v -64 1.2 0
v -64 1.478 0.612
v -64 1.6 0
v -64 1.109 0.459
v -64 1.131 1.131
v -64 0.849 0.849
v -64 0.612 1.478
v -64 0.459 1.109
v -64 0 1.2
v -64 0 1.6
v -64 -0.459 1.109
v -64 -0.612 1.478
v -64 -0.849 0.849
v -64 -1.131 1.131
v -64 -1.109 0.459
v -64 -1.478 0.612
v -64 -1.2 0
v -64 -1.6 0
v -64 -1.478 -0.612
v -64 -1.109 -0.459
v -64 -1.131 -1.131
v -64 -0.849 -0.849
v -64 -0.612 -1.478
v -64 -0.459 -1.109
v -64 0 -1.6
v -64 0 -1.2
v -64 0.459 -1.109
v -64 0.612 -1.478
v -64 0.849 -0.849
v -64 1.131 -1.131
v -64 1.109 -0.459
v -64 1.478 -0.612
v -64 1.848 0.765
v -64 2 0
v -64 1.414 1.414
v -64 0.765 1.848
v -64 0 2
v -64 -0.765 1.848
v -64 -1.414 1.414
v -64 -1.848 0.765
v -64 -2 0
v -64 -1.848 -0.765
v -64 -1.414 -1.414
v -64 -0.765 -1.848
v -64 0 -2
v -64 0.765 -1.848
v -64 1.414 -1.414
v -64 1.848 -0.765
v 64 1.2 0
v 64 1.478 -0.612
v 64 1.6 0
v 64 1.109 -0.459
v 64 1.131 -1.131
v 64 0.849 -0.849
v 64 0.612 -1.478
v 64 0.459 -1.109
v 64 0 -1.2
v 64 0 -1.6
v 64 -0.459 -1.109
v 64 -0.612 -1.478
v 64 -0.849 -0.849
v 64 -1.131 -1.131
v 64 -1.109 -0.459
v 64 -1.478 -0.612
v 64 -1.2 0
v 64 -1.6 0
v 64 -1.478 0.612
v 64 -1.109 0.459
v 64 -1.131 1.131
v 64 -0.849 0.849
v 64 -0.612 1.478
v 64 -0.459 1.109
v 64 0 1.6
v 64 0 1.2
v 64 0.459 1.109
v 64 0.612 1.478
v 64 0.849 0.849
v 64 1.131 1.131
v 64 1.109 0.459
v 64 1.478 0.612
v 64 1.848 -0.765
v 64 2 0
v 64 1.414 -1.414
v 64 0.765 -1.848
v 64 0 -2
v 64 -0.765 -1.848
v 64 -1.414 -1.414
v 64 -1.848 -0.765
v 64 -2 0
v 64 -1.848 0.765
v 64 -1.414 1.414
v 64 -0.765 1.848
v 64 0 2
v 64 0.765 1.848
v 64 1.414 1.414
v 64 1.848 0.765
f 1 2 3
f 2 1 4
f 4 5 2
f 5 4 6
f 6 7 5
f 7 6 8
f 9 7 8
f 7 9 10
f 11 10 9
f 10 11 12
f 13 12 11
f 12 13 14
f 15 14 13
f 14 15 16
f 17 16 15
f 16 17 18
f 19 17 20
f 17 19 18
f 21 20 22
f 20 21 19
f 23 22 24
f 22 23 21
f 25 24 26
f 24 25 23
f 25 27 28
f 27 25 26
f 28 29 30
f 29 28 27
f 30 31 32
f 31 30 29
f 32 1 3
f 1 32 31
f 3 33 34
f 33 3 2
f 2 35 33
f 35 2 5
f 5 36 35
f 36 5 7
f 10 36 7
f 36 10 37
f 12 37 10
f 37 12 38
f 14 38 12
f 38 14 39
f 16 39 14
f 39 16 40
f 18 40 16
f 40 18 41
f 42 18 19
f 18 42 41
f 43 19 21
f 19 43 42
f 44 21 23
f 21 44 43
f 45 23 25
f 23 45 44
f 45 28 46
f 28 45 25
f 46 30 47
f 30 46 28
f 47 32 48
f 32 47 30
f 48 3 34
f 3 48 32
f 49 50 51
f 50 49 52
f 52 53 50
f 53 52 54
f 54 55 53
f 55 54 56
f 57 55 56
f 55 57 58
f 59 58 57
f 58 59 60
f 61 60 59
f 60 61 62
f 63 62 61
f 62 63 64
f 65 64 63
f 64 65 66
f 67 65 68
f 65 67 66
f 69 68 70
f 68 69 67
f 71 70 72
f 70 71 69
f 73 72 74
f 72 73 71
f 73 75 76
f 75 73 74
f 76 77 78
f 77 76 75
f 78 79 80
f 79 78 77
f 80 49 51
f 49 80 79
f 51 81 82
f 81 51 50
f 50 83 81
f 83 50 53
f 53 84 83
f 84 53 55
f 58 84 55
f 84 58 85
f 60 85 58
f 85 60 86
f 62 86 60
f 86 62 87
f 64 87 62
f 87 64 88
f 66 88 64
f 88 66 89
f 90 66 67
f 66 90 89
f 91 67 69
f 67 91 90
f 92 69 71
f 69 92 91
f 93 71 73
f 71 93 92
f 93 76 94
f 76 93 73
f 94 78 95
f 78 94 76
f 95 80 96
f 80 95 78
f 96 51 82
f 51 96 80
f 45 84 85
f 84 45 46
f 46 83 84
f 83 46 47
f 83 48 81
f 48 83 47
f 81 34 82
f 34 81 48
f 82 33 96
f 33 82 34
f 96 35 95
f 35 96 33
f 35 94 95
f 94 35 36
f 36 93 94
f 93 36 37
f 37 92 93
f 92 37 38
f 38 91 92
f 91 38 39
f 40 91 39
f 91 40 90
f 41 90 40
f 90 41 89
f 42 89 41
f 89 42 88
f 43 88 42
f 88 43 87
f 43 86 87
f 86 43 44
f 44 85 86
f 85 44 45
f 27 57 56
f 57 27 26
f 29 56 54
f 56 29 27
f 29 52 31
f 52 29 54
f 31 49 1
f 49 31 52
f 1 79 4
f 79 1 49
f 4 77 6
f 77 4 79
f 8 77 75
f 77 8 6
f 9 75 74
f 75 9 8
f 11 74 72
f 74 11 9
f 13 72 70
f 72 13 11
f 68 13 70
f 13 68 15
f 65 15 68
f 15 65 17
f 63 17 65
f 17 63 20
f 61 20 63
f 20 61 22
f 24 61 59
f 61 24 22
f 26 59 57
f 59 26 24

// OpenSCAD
// file: ../p/4-4disc.scad
use <../lib.scad>
$fa=1; $fs=0.2;
function ldraw_lib__4_4disc(realsolid=false) = [
// 0 Disc 1.0
// 0 Name: 4-4disc.dat
// 0 Author: James Jessiman
// 0 !LDRAW_ORG Primitive UPDATE 2002-02
// 0 !LICENSE Licensed under CC BY 2.0 and CC BY 4.0 : see CAreadme.txt
// 
// 0 BFC CERTIFY CCW
  [0,"BFC","CERTIFY"],
  [0,"BFC","CCW"],
// 
// 0 !HISTORY 1998-12-15 [PTadmin] Official Update 1998-10
// 0 !HISTORY 2002-03-23 [sbliss] Added BFC statement
// 0 !HISTORY 2002-04-25 [PTadmin] Official Update 2002-02
// 0 !HISTORY 2007-06-24 [PTadmin] Header formatted for Contributor Agreement
// 0 !HISTORY 2008-07-01 [PTadmin] Official Update 2008-01
// 
// 
// 3 16 0 0 0 1 0 0 0.9239 0 0.3827
  [3,16,0,0,0,1,0,0,0.9239,0,0.3827],
// 3 16 0 0 0 0.9239 0 0.3827 0.7071 0 0.7071
  [3,16,0,0,0,0.9239,0,0.3827,0.7071,0,0.7071],
// 3 16 0 0 0 0.7071 0 0.7071 0.3827 0 0.9239
  [3,16,0,0,0,0.7071,0,0.7071,0.3827,0,0.9239],
// 3 16 0 0 0 0.3827 0 0.9239 0 0 1
  [3,16,0,0,0,0.3827,0,0.9239,0,0,1],
// 3 16 0 0 0 0 0 1 -0.3827 0 0.9239
  [3,16,0,0,0,0,0,1,-0.3827,0,0.9239],
// 3 16 0 0 0 -0.3827 0 0.9239 -0.7071 0 0.7071
  [3,16,0,0,0,-0.3827,0,0.9239,-0.7071,0,0.7071],
// 3 16 0 0 0 -0.7071 0 0.7071 -0.9239 0 0.3827
  [3,16,0,0,0,-0.7071,0,0.7071,-0.9239,0,0.3827],
// 3 16 0 0 0 -0.9239 0 0.3827 -1 0 -0
  [3,16,0,0,0,-0.9239,0,0.3827,-1,0,-0],
// 3 16 0 0 0 -1 0 -0 -0.9239 0 -0.3827
  [3,16,0,0,0,-1,0,-0,-0.9239,0,-0.3827],
// 3 16 0 0 0 -0.9239 0 -0.3827 -0.7071 0 -0.7071
  [3,16,0,0,0,-0.9239,0,-0.3827,-0.7071,0,-0.7071],
// 3 16 0 0 0 -0.7071 0 -0.7071 -0.3827 0 -0.9239
  [3,16,0,0,0,-0.7071,0,-0.7071,-0.3827,0,-0.9239],
// 3 16 0 0 0 -0.3827 0 -0.9239 0 0 -1
  [3,16,0,0,0,-0.3827,0,-0.9239,0,0,-1],
// 3 16 0 0 0 0 0 -1 0.3827 0 -0.9239
  [3,16,0,0,0,0,0,-1,0.3827,0,-0.9239],
// 3 16 0 0 0 0.3827 0 -0.9239 0.7071 0 -0.7071
  [3,16,0,0,0,0.3827,0,-0.9239,0.7071,0,-0.7071],
// 3 16 0 0 0 0.7071 0 -0.7071 0.9239 0 -0.3827
  [3,16,0,0,0,0.7071,0,-0.7071,0.9239,0,-0.3827],
// 3 16 0 0 0 0.9239 0 -0.3827 1 0 0
  [3,16,0,0,0,0.9239,0,-0.3827,1,0,0],
// 0
];
module ldraw_lib__4_4disc(step=0, col=false, unit=2/5, alt=false, line=0.2, solid=!$preview)
    makepoly(ldraw_lib__4_4disc(solid), step=step, col=col, unit=unit, alt=alt, line=line, solid=solid);
ldraw_lib__4_4disc(line=0.2);
// file: ../p/stud3.scad
use <../lib.scad>
use <4-4cyli.scad>
use <4-4disc.scad>
use <4-4edge.scad>
$fa=1; $fs=0.2;
function ldraw_lib__stud3(realsolid=false) = realsolid ? 
    [openscad(translate([0,0,-eps()], o=cylinder(4+eps(), r=4)),2)] : [
// 0 Stud Tube Solid
// 0 Name: stud3.dat
// 0 Author: James Jessiman
// 0 !LDRAW_ORG Primitive UPDATE 2012-01
// 0 !LICENSE Licensed under CC BY 2.0 and CC BY 4.0 : see CAreadme.txt
// 
// 0 BFC CERTIFY CCW
  [0,"BFC","CERTIFY"],
  [0,"BFC","CCW"],
// 
// 0 !HISTORY 2002-04-04 [sbliss] Modified for BFC compliance
// 0 !HISTORY 2002-04-25 [PTadmin] Official Update 2002-02
// 0 !HISTORY 2007-06-24 [PTadmin] Header formatted for Contributor Agreement
// 0 !HISTORY 2008-07-01 [PTadmin] Official Update 2008-01
// 0 !HISTORY 2012-02-16 [Philo] Changed to CCW
// 0 !HISTORY 2012-03-30 [PTadmin] Official Update 2012-01
// 
// 
// 1 16 0 -4 0 4 0 0 0 1 0 0 0 4 4-4edge.dat
  [1,16,0,-4,0,4,0,0,0,1,0,0,0,4, ldraw_lib__4_4edge(realsolid)],
// 1 16 0 0 0 4 0 0 0 1 0 0 0 4 4-4edge.dat
  [1,16,0,0,0,4,0,0,0,1,0,0,0,4, ldraw_lib__4_4edge(realsolid)],
// 1 16 0 -4 0 4 0 0 0 1 0 0 0 4 4-4disc.dat
  [1,16,0,-4,0,4,0,0,0,1,0,0,0,4, ldraw_lib__4_4disc(realsolid)],
// 1 16 0 -4 0 4 0 0 0 4 0 0 0 4 4-4cyli.dat
  [1,16,0,-4,0,4,0,0,0,4,0,0,0,4, ldraw_lib__4_4cyli(realsolid)],
];
module ldraw_lib__stud3(step=0, col=false, unit=2/5, alt=false, line=0.2, solid=!$preview)
    makepoly(ldraw_lib__stud3(solid), step=step, col=col, unit=unit, alt=alt, line=line, solid=solid);
ldraw_lib__stud3(line=0.2);
// file: ../p/stud.scad
use <../lib.scad>
use <4-4cyli.scad>
use <4-4disc.scad>
use <4-4edge.scad>
$fa=1; $fs=0.2;
function ldraw_lib__stud(realsolid=false) = realsolid ? 
    [openscad(translate([0,0,-eps()], o=cylinder(4+eps(), r=6)),2)] : [
// 0 Stud
// 0 Name: stud.dat
// 0 Author: James Jessiman
// 0 !LDRAW_ORG Primitive UPDATE 2012-01
// 0 !LICENSE Licensed under CC BY 2.0 and CC BY 4.0 : see CAreadme.txt
// 
// 0 BFC CERTIFY CCW
  [0,"BFC","CERTIFY"],
  [0,"BFC","CCW"],
// 
// 0 !HISTORY 2002-04-04 [sbliss] Modified for BFC compliance
// 0 !HISTORY 2002-04-25 [PTadmin] Official Update 2002-02
// 0 !HISTORY 2007-06-24 [PTadmin] Header formatted for Contributor Agreement
// 0 !HISTORY 2008-07-01 [PTadmin] Official Update 2008-01
// 0 !HISTORY 2012-02-16 [Philo] Changed to CCW
// 0 !HISTORY 2012-03-30 [PTadmin] Official Update 2012-01
// 
// 
// 1 16 0 0 0 6 0 0 0 1 0 0 0 6 4-4edge.dat
  [1,16,0,0,0,6,0,0,0,1,0,0,0,6, ldraw_lib__4_4edge(realsolid)],
// 1 16 0 -4 0 6 0 0 0 1 0 0 0 6 4-4edge.dat
  [1,16,0,-4,0,6,0,0,0,1,0,0,0,6, ldraw_lib__4_4edge(realsolid)],
// 1 16 0 0 0 6 0 0 0 -4 0 0 0 6 4-4cyli.dat
  [1,16,0,0,0,6,0,0,0,-4,0,0,0,6, ldraw_lib__4_4cyli(realsolid)],
// 1 16 0 -4 0 6 0 0 0 1 0 0 0 6 4-4disc.dat
  [1,16,0,-4,0,6,0,0,0,1,0,0,0,6, ldraw_lib__4_4disc(realsolid)],
];
module ldraw_lib__stud(step=0, col=false, unit=2/5, alt=false, line=0.2, solid=!$preview)
    makepoly(ldraw_lib__stud(solid), step=step, col=col, unit=unit, alt=alt, line=line, solid=solid);
ldraw_lib__stud(line=0.2);
// file: ../p/box5.scad
use <../lib.scad>
$fa=1; $fs=0.2;
function ldraw_lib__box5(realsolid=false) = [
// 0 Box with 5 Faces and All Edges
// 0 Name: box5.dat
// 0 Author: James Jessiman
// 0 !LDRAW_ORG Primitive UPDATE 2012-01
// 0 !LICENSE Licensed under CC BY 2.0 and CC BY 4.0 : see CAreadme.txt
// 
// 0 BFC CERTIFY CCW
  [0,"BFC","CERTIFY"],
  [0,"BFC","CCW"],
// 
// 0 !HISTORY 2002-04-03 [sbliss] Modified for BFC compliance
// 0 !HISTORY 2002-04-25 [PTadmin] Official Update 2002-02
// 0 !HISTORY 2007-06-24 [PTadmin] Header formatted for Contributor Agreement
// 0 !HISTORY 2008-07-01 [PTadmin] Official Update 2008-01
// 0 !HISTORY 2012-02-16 [Philo] Changed to CCW
// 0 !HISTORY 2012-03-30 [PTadmin] Official Update 2012-01
// 
// 
// 2 24 1 1 1 -1 1 1
  [2,24,1,1,1,-1,1,1],
// 2 24 -1 1 1 -1 1 -1
  [2,24,-1,1,1,-1,1,-1],
// 2 24 -1 1 -1 1 1 -1
  [2,24,-1,1,-1,1,1,-1],
// 2 24 1 1 -1 1 1 1
  [2,24,1,1,-1,1,1,1],
// 2 24 1 0 1 -1 0 1
  [2,24,1,0,1,-1,0,1],
// 2 24 -1 0 1 -1 0 -1
  [2,24,-1,0,1,-1,0,-1],
// 2 24 -1 0 -1 1 0 -1
  [2,24,-1,0,-1,1,0,-1],
// 2 24 1 0 -1 1 0 1
  [2,24,1,0,-1,1,0,1],
// 2 24 1 0 1 1 1 1
  [2,24,1,0,1,1,1,1],
// 2 24 -1 0 1 -1 1 1
  [2,24,-1,0,1,-1,1,1],
// 2 24 1 0 -1 1 1 -1
  [2,24,1,0,-1,1,1,-1],
// 2 24 -1 0 -1 -1 1 -1
  [2,24,-1,0,-1,-1,1,-1],
// 4 16 -1 1 1 1 1 1 1 1 -1 -1 1 -1
  [4,16,-1,1,1,1,1,1,1,1,-1,-1,1,-1],
// 4 16 -1 1 1 -1 0 1 1 0 1 1 1 1
  [4,16,-1,1,1,-1,0,1,1,0,1,1,1,1],
// 4 16 -1 1 -1 -1 0 -1 -1 0 1 -1 1 1
  [4,16,-1,1,-1,-1,0,-1,-1,0,1,-1,1,1],
// 4 16 1 1 -1 1 0 -1 -1 0 -1 -1 1 -1
  [4,16,1,1,-1,1,0,-1,-1,0,-1,-1,1,-1],
// 4 16 1 1 1 1 0 1 1 0 -1 1 1 -1
  [4,16,1,1,1,1,0,1,1,0,-1,1,1,-1],
];
module ldraw_lib__box5(step=0, col=false, unit=2/5, alt=false, line=0.2, solid=!$preview)
    makepoly(ldraw_lib__box5(solid), step=step, col=col, unit=unit, alt=alt, line=line, solid=solid);
ldraw_lib__box5(line=0.2);
// file: ../p/box4t.scad
use <../lib.scad>
$fa=1; $fs=0.2;
function ldraw_lib__box4t(realsolid=false) = [
// 0 Box with 4 Adjacent Faces and All Edges
// 0 Name: box4t.dat
// 0 Author: Tore Eriksson [Tore_Eriksson]
// 0 !LDRAW_ORG Primitive UPDATE 2003-02
// 0 !LICENSE Licensed under CC BY 2.0 and CC BY 4.0 : see CAreadme.txt
// 
// 0 BFC CERTIFY CCW
  [0,"BFC","CERTIFY"],
  [0,"BFC","CCW"],
// 
// 0 !HISTORY 1997-09-29 [PTadmin] Official Update 1997-15
// 0 !HISTORY 2002-08-31 [izanette] Modified with WINDZ for BFC compliance
// 0 !HISTORY 2003-08-01 [PTadmin] Official Update 2003-02
// 0 !HISTORY 2007-06-24 [PTadmin] Header formatted for Contributor Agreement
// 0 !HISTORY 2008-07-01 [PTadmin] Official Update 2008-01
// 
// 
// 2 24 1 1 1 -1 1 1
  [2,24,1,1,1,-1,1,1],
// 2 24 -1 1 1 -1 1 -1
  [2,24,-1,1,1,-1,1,-1],
// 2 24 -1 1 -1 1 1 -1
  [2,24,-1,1,-1,1,1,-1],
// 2 24 1 1 -1 1 1 1
  [2,24,1,1,-1,1,1,1],
// 2 24 1 0 1 -1 0 1
  [2,24,1,0,1,-1,0,1],
// 2 24 -1 0 1 -1 0 -1
  [2,24,-1,0,1,-1,0,-1],
// 2 24 -1 0 -1 1 0 -1
  [2,24,-1,0,-1,1,0,-1],
// 2 24 1 0 -1 1 0 1
  [2,24,1,0,-1,1,0,1],
// 2 24 1 0 1 1 1 1
  [2,24,1,0,1,1,1,1],
// 2 24 -1 0 1 -1 1 1
  [2,24,-1,0,1,-1,1,1],
// 2 24 1 0 -1 1 1 -1
  [2,24,1,0,-1,1,1,-1],
// 2 24 -1 0 -1 -1 1 -1
  [2,24,-1,0,-1,-1,1,-1],
// 4 16 1 1 1 1 1 -1 -1 1 -1 -1 1 1
  [4,16,1,1,1,1,1,-1,-1,1,-1,-1,1,1],
// 4 16 1 1 1 -1 1 1 -1 0 1 1 0 1
  [4,16,1,1,1,-1,1,1,-1,0,1,1,0,1],
// 4 16 -1 1 1 -1 1 -1 -1 0 -1 -1 0 1
  [4,16,-1,1,1,-1,1,-1,-1,0,-1,-1,0,1],
// 0 4 16 -1 1 -1 -1 0 -1 1 0 -1 1 1 -1
// 4 16 1 1 -1 1 1 1 1 0 1 1 0 -1
  [4,16,1,1,-1,1,1,1,1,0,1,1,0,-1],
// 0
];
module ldraw_lib__box4t(step=0, col=false, unit=2/5, alt=false, line=0.2, solid=!$preview)
    makepoly(ldraw_lib__box4t(solid), step=step, col=col, unit=unit, alt=alt, line=line, solid=solid);
ldraw_lib__box4t(line=0.2);
// file: s/3004s01.scad
use <../../lib.scad>
use <../../p/box4t.scad>
use <../../p/box5.scad>
use <../../p/stud.scad>
use <../../p/stud3.scad>
$fa=1; $fs=0.2;
function ldraw_lib__s__3004s01(realsolid=false) = [
// 0 ~Brick  1 x  2 without Front Face
// 0 Name: s\3004s01.dat
// 0 Author: James Jessiman
// 0 !LDRAW_ORG Subpart UPDATE 2003-03
// 0 !LICENSE Licensed under CC BY 2.0 and CC BY 4.0 : see CAreadme.txt
// 
// 0 BFC CERTIFY CCW
  [0,"BFC","CERTIFY"],
  [0,"BFC","CCW"],
// 
// 0 !HISTORY 2003-09-07 [jriley] Subfiling, BFC
// 0 !HISTORY 2003-12-19 [PTadmin] Official Update 2003-03
// 0 !HISTORY 2007-08-29 [PTadmin] Header formatted for Contributor Agreement
// 0 !HISTORY 2008-07-01 [PTadmin] Official Update 2008-01
// 
// 
// 1 16 0 4 0 1 0 0 0 -5 0 0 0 1 stud3.dat
  [1,16,0,4,0,1,0,0,0,-5,0,0,0,1, ldraw_lib__stud3(realsolid)],
// 0 BFC INVERTNEXT
  [0,"BFC","INVERTNEXT"],
// 1 16 0 24 0 16 0 0 0 -20 0 0 0 6 box5.dat
  [1,16,0,24,0,16,0,0,0,-20,0,0,0,6, ldraw_lib__box5(realsolid)],
// 4 16 20 24 10 16 24 6 -16 24 6 -20 24 10
  [4,16,20,24,10,16,24,6,-16,24,6,-20,24,10],
// 4 16 -20 24 10 -16 24 6 -16 24 -6 -20 24 -10
  [4,16,-20,24,10,-16,24,6,-16,24,-6,-20,24,-10],
// 4 16 -20 24 -10 -16 24 -6 16 24 -6 20 24 -10
  [4,16,-20,24,-10,-16,24,-6,16,24,-6,20,24,-10],
// 4 16 20 24 -10 16 24 -6 16 24 6 20 24 10
  [4,16,20,24,-10,16,24,-6,16,24,6,20,24,10],
// 1 16 0 24 0 20 0 0 0 -24 0 0 0 10 box4t.dat
  [1,16,0,24,0,20,0,0,0,-24,0,0,0,10, ldraw_lib__box4t(realsolid)],
// 1 16 10 0 0 1 0 0 0 1 0 0 0 1 stud.dat
  [1,16,10,0,0,1,0,0,0,1,0,0,0,1, ldraw_lib__stud(realsolid)],
// 1 16 -10 0 0 1 0 0 0 1 0 0 0 1 stud.dat
  [1,16,-10,0,0,1,0,0,0,1,0,0,0,1, ldraw_lib__stud(realsolid)],
// 0
];
module ldraw_lib__s__3004s01(step=0, col=false, unit=2/5, alt=false, line=0.2, solid=!$preview)
    makepoly(ldraw_lib__s__3004s01(solid), step=step, col=col, unit=unit, alt=alt, line=line, solid=solid);
ldraw_lib__s__3004s01(line=0.2);
// file: ../p/4-4cyli.scad
use <../lib.scad>
$fa=1; $fs=0.2;
function ldraw_lib__4_4cyli(realsolid=false) = [
// 0 Cylinder 1.0
// 0 Name: 4-4cyli.dat
// 0 Author: James Jessiman
// 0 !LDRAW_ORG Primitive UPDATE 2005-01
// 0 !LICENSE Licensed under CC BY 2.0 and CC BY 4.0 : see CAreadme.txt
// 
// 0 BFC CERTIFY CCW
  [0,"BFC","CERTIFY"],
  [0,"BFC","CCW"],
// 
// 0 !HISTORY 1998-12-15 [PTadmin] Official Update 1998-10
// 0 !HISTORY 2002-03-23 [sbliss] Added BFC statement; merged headers from files in distributions LDraw 0.27 and Complete.
// 0 !HISTORY 2002-04-25 [PTadmin] Official Update 2002-02
// 0 !HISTORY 2004-12-14 [guyvivan] BFC CCW
// 0 !HISTORY 2005-12-28 [PTadmin] Official Update 2005-01
// 0 !HISTORY 2007-06-24 [PTadmin] Header formatted for Contributor Agreement
// 0 !HISTORY 2008-07-01 [PTadmin] Official Update 2008-01
// 
// 
// 4 16 1 1 0 0.9239 1 0.3827 0.9239 0 0.3827 1 0 0
  [4,16,1,1,0,0.9239,1,0.3827,0.9239,0,0.3827,1,0,0],
// 5 24 1 0 0 1 1 0 0.9239 0 0.3827 0.9239 0 -0.3827
  [5,24,1,0,0,1,1,0,0.9239,0,0.3827,0.9239,0,-0.3827],
// 4 16 0.9239 1 0.3827 0.7071 1 0.7071 0.7071 0 0.7071 0.9239 0 0.3827
  [4,16,0.9239,1,0.3827,0.7071,1,0.7071,0.7071,0,0.7071,0.9239,0,0.3827],
// 5 24 0.9239 0 0.3827 0.9239 1 0.3827 0.7071 0 0.7071 1 0 0
  [5,24,0.9239,0,0.3827,0.9239,1,0.3827,0.7071,0,0.7071,1,0,0],
// 4 16 0.7071 1 0.7071 0.3827 1 0.9239 0.3827 0 0.9239 0.7071 0 0.7071
  [4,16,0.7071,1,0.7071,0.3827,1,0.9239,0.3827,0,0.9239,0.7071,0,0.7071],
// 5 24 0.7071 0 0.7071 0.7071 1 0.7071 0.3827 0 0.9239 0.9239 0 0.3827
  [5,24,0.7071,0,0.7071,0.7071,1,0.7071,0.3827,0,0.9239,0.9239,0,0.3827],
// 4 16 0.3827 1 0.9239 0 1 1 0 0 1 0.3827 0 0.9239
  [4,16,0.3827,1,0.9239,0,1,1,0,0,1,0.3827,0,0.9239],
// 5 24 0.3827 0 0.9239 0.3827 1 0.9239 0 0 1 0.7071 0 0.7071
  [5,24,0.3827,0,0.9239,0.3827,1,0.9239,0,0,1,0.7071,0,0.7071],
// 4 16 0 1 1 -0.3827 1 0.9239 -0.3827 0 0.9239 0 0 1
  [4,16,0,1,1,-0.3827,1,0.9239,-0.3827,0,0.9239,0,0,1],
// 5 24 0 0 1 0 1 1 -0.3827 0 0.9239 0.3827 0 0.9239
  [5,24,0,0,1,0,1,1,-0.3827,0,0.9239,0.3827,0,0.9239],
// 4 16 -0.3827 1 0.9239 -0.7071 1 0.7071 -0.7071 0 0.7071 -0.3827 0 0.9239
  [4,16,-0.3827,1,0.9239,-0.7071,1,0.7071,-0.7071,0,0.7071,-0.3827,0,0.9239],
// 5 24 -0.3827 0 0.9239 -0.3827 1 0.9239 -0.7071 0 0.7071 0 0 1
  [5,24,-0.3827,0,0.9239,-0.3827,1,0.9239,-0.7071,0,0.7071,0,0,1],
// 4 16 -0.7071 1 0.7071 -0.9239 1 0.3827 -0.9239 0 0.3827 -0.7071 0 0.7071
  [4,16,-0.7071,1,0.7071,-0.9239,1,0.3827,-0.9239,0,0.3827,-0.7071,0,0.7071],
// 5 24 -0.7071 0 0.7071 -0.7071 1 0.7071 -0.9239 0 0.3827 -0.3827 0 0.9239
  [5,24,-0.7071,0,0.7071,-0.7071,1,0.7071,-0.9239,0,0.3827,-0.3827,0,0.9239],
// 4 16 -0.9239 1 0.3827 -1 1 0 -1 0 0 -0.9239 0 0.3827
  [4,16,-0.9239,1,0.3827,-1,1,0,-1,0,0,-0.9239,0,0.3827],
// 5 24 -0.9239 0 0.3827 -0.9239 1 0.3827 -1 0 0 -0.7071 0 0.7071
  [5,24,-0.9239,0,0.3827,-0.9239,1,0.3827,-1,0,0,-0.7071,0,0.7071],
// 4 16 -1 1 0 -0.9239 1 -0.3827 -0.9239 0 -0.3827 -1 0 0
  [4,16,-1,1,0,-0.9239,1,-0.3827,-0.9239,0,-0.3827,-1,0,0],
// 5 24 -1 0 0 -1 1 0 -0.9239 0 -0.3827 -0.9239 0 0.3827
  [5,24,-1,0,0,-1,1,0,-0.9239,0,-0.3827,-0.9239,0,0.3827],
// 4 16 -0.9239 1 -0.3827 -0.7071 1 -0.7071 -0.7071 0 -0.7071 -0.9239 0 -0.3827
  [4,16,-0.9239,1,-0.3827,-0.7071,1,-0.7071,-0.7071,0,-0.7071,-0.9239,0,-0.3827],
// 5 24 -0.9239 0 -0.3827 -0.9239 1 -0.3827 -0.7071 0 -0.7071 -1 0 0
  [5,24,-0.9239,0,-0.3827,-0.9239,1,-0.3827,-0.7071,0,-0.7071,-1,0,0],
// 4 16 -0.7071 1 -0.7071 -0.3827 1 -0.9239 -0.3827 0 -0.9239 -0.7071 0 -0.7071
  [4,16,-0.7071,1,-0.7071,-0.3827,1,-0.9239,-0.3827,0,-0.9239,-0.7071,0,-0.7071],
// 5 24 -0.7071 0 -0.7071 -0.7071 1 -0.7071 -0.3827 0 -0.9239 -0.9239 0 -0.3827
  [5,24,-0.7071,0,-0.7071,-0.7071,1,-0.7071,-0.3827,0,-0.9239,-0.9239,0,-0.3827],
// 4 16 -0.3827 1 -0.9239 0 1 -1 0 0 -1 -0.3827 0 -0.9239
  [4,16,-0.3827,1,-0.9239,0,1,-1,0,0,-1,-0.3827,0,-0.9239],
// 5 24 -0.3827 0 -0.9239 -0.3827 1 -0.9239 0 0 -1 -0.7071 0 -0.7071
  [5,24,-0.3827,0,-0.9239,-0.3827,1,-0.9239,0,0,-1,-0.7071,0,-0.7071],
// 4 16 0 1 -1 0.3827 1 -0.9239 0.3827 0 -0.9239 0 0 -1
  [4,16,0,1,-1,0.3827,1,-0.9239,0.3827,0,-0.9239,0,0,-1],
// 5 24 0 0 -1 0 1 -1 0.3827 0 -0.9239 -0.3827 0 -0.9239
  [5,24,0,0,-1,0,1,-1,0.3827,0,-0.9239,-0.3827,0,-0.9239],
// 4 16 0.3827 1 -0.9239 0.7071 1 -0.7071 0.7071 0 -0.7071 0.3827 0 -0.9239
  [4,16,0.3827,1,-0.9239,0.7071,1,-0.7071,0.7071,0,-0.7071,0.3827,0,-0.9239],
// 5 24 0.3827 0 -0.9239 0.3827 1 -0.9239 0.7071 0 -0.7071 0 0 -1
  [5,24,0.3827,0,-0.9239,0.3827,1,-0.9239,0.7071,0,-0.7071,0,0,-1],
// 4 16 0.7071 1 -0.7071 0.9239 1 -0.3827 0.9239 0 -0.3827 0.7071 0 -0.7071
  [4,16,0.7071,1,-0.7071,0.9239,1,-0.3827,0.9239,0,-0.3827,0.7071,0,-0.7071],
// 5 24 0.7071 0 -0.7071 0.7071 1 -0.7071 0.9239 0 -0.3827 0.3827 0 -0.9239
  [5,24,0.7071,0,-0.7071,0.7071,1,-0.7071,0.9239,0,-0.3827,0.3827,0,-0.9239],
// 4 16 0.9239 1 -0.3827 1 1 0 1 0 0 0.9239 0 -0.3827
  [4,16,0.9239,1,-0.3827,1,1,0,1,0,0,0.9239,0,-0.3827],
// 5 24 0.9239 0 -0.3827 0.9239 1 -0.3827 1 0 0 0.7071 0 -0.7071
  [5,24,0.9239,0,-0.3827,0.9239,1,-0.3827,1,0,0,0.7071,0,-0.7071],
// 0
];
module ldraw_lib__4_4cyli(step=0, col=false, unit=2/5, alt=false, line=0.2, solid=!$preview)
    makepoly(ldraw_lib__4_4cyli(solid), step=step, col=col, unit=unit, alt=alt, line=line, solid=solid);
ldraw_lib__4_4cyli(line=0.2);
// file: ../p/4-4ring4.scad
use <../lib.scad>
$fa=1; $fs=0.2;
function ldraw_lib__4_4ring4(realsolid=false) = [
// 0 Ring  4 x 1.0
// 0 Name: 4-4ring4.dat
// 0 Author: James Jessiman
// 0 !LDRAW_ORG Primitive UPDATE 2009-01
// 0 !LICENSE Licensed under CC BY 2.0 and CC BY 4.0 : see CAreadme.txt
// 
// 0 BFC CERTIFY CCW
  [0,"BFC","CERTIFY"],
  [0,"BFC","CCW"],
// 
// 0 !HISTORY 1998-12-15 [PTadmin] Official Update 1998-10
// 0 !HISTORY 2002-04-08 [BrickCaster] Modified for BFC compliance
// 0 !HISTORY 2002-04-25 [PTadmin] Official Update 2002-02
// 0 !HISTORY 2007-06-24 [PTadmin] Header formatted for Contributor Agreement
// 0 !HISTORY 2008-07-01 [PTadmin] Official Update 2008-01
// 0 !HISTORY 2008-08-26 [cwdee] Switch polygon winding and rename
// 0 !HISTORY 2009-05-02 [PTadmin] Official Update 2009-01
// 
// 
// 4 16 -1.9135 0 4.6195 -1.5308 0 3.6956 0 0 4 0 0 5
  [4,16,-1.9135,0,4.6195,-1.5308,0,3.6956,0,0,4,0,0,5],
// 4 16 -3.5355 0 3.5355 -2.8284 0 2.8284 -1.5308 0 3.6956 -1.9135 0 4.6195
  [4,16,-3.5355,0,3.5355,-2.8284,0,2.8284,-1.5308,0,3.6956,-1.9135,0,4.6195],
// 4 16 -4.6195 0 1.9135 -3.6956 0 1.5308 -2.8284 0 2.8284 -3.5355 0 3.5355
  [4,16,-4.6195,0,1.9135,-3.6956,0,1.5308,-2.8284,0,2.8284,-3.5355,0,3.5355],
// 4 16 -5 0 0 -4 0 0 -3.6956 0 1.5308 -4.6195 0 1.9135
  [4,16,-5,0,0,-4,0,0,-3.6956,0,1.5308,-4.6195,0,1.9135],
// 4 16 -4.6195 0 -1.9135 -3.6956 0 -1.5308 -4 0 0 -5 0 0
  [4,16,-4.6195,0,-1.9135,-3.6956,0,-1.5308,-4,0,0,-5,0,0],
// 4 16 -3.5355 0 -3.5355 -2.8284 0 -2.8284 -3.6956 0 -1.5308 -4.6195 0 -1.9135
  [4,16,-3.5355,0,-3.5355,-2.8284,0,-2.8284,-3.6956,0,-1.5308,-4.6195,0,-1.9135],
// 4 16 -1.9135 0 -4.6195 -1.5308 0 -3.6956 -2.8284 0 -2.8284 -3.5355 0 -3.5355
  [4,16,-1.9135,0,-4.6195,-1.5308,0,-3.6956,-2.8284,0,-2.8284,-3.5355,0,-3.5355],
// 4 16 0 0 -5 0 0 -4 -1.5308 0 -3.6956 -1.9135 0 -4.6195
  [4,16,0,0,-5,0,0,-4,-1.5308,0,-3.6956,-1.9135,0,-4.6195],
// 4 16 1.9135 0 -4.6195 1.5308 0 -3.6956 0 0 -4 0 0 -5
  [4,16,1.9135,0,-4.6195,1.5308,0,-3.6956,0,0,-4,0,0,-5],
// 4 16 3.5355 0 -3.5355 2.8284 0 -2.8284 1.5308 0 -3.6956 1.9135 0 -4.6195
  [4,16,3.5355,0,-3.5355,2.8284,0,-2.8284,1.5308,0,-3.6956,1.9135,0,-4.6195],
// 4 16 4.6195 0 -1.9135 3.6956 0 -1.5308 2.8284 0 -2.8284 3.5355 0 -3.5355
  [4,16,4.6195,0,-1.9135,3.6956,0,-1.5308,2.8284,0,-2.8284,3.5355,0,-3.5355],
// 4 16 5 0 0 4 0 0 3.6956 0 -1.5308 4.6195 0 -1.9135
  [4,16,5,0,0,4,0,0,3.6956,0,-1.5308,4.6195,0,-1.9135],
// 4 16 4.6195 0 1.9135 3.6956 0 1.5308 4 0 0 5 0 0
  [4,16,4.6195,0,1.9135,3.6956,0,1.5308,4,0,0,5,0,0],
// 4 16 3.5355 0 3.5355 2.8284 0 2.8284 3.6956 0 1.5308 4.6195 0 1.9135
  [4,16,3.5355,0,3.5355,2.8284,0,2.8284,3.6956,0,1.5308,4.6195,0,1.9135],
// 4 16 1.9135 0 4.6195 1.5308 0 3.6956 2.8284 0 2.8284 3.5355 0 3.5355
  [4,16,1.9135,0,4.6195,1.5308,0,3.6956,2.8284,0,2.8284,3.5355,0,3.5355],
// 4 16 0 0 5 0 0 4 1.5308 0 3.6956 1.9135 0 4.6195
  [4,16,0,0,5,0,0,4,1.5308,0,3.6956,1.9135,0,4.6195],
// 0
];
module ldraw_lib__4_4ring4(step=0, col=false, unit=2/5, alt=false, line=0.2, solid=!$preview)
    makepoly(ldraw_lib__4_4ring4(solid), step=step, col=col, unit=unit, alt=alt, line=line, solid=solid);
ldraw_lib__4_4ring4(line=0.2);
// file: ../p/4-4ring3.scad
use <../lib.scad>
$fa=1; $fs=0.2;
function ldraw_lib__4_4ring3(realsolid=false) = [
// 0 Ring  3 x 1.0
// 0 Name: 4-4ring3.dat
// 0 Author: James Jessiman
// 0 !LDRAW_ORG Primitive UPDATE 2009-01
// 0 !LICENSE Licensed under CC BY 2.0 and CC BY 4.0 : see CAreadme.txt
// 
// 0 BFC CERTIFY CCW
  [0,"BFC","CERTIFY"],
  [0,"BFC","CCW"],
// 
// 0 !HISTORY 1998-12-15 [PTadmin] Official Update 1998-10
// 0 !HISTORY 2002-04-05 [hafhead] Added BFC statement
// 0 !HISTORY 2002-04-25 [PTadmin] Official Update 2002-02
// 0 !HISTORY 2007-06-24 [PTadmin] Header formatted for Contributor Agreement
// 0 !HISTORY 2008-07-01 [PTadmin] Official Update 2008-01
// 0 !HISTORY 2008-08-26 [cwdee] Switch polygon winding and rename
// 0 !HISTORY 2009-05-02 [PTadmin] Official Update 2009-01
// 
// 
// 4 16 -1.5308 0 3.6956 -1.1481 0 2.7717 0 0 3 0 0 4
  [4,16,-1.5308,0,3.6956,-1.1481,0,2.7717,0,0,3,0,0,4],
// 4 16 -2.8284 0 2.8284 -2.1213 0 2.1213 -1.1481 0 2.7717 -1.5308 0 3.6956
  [4,16,-2.8284,0,2.8284,-2.1213,0,2.1213,-1.1481,0,2.7717,-1.5308,0,3.6956],
// 4 16 -3.6956 0 1.5308 -2.7717 0 1.1481 -2.1213 0 2.1213 -2.8284 0 2.8284
  [4,16,-3.6956,0,1.5308,-2.7717,0,1.1481,-2.1213,0,2.1213,-2.8284,0,2.8284],
// 4 16 -4 0 0 -3 0 0 -2.7717 0 1.1481 -3.6956 0 1.5308
  [4,16,-4,0,0,-3,0,0,-2.7717,0,1.1481,-3.6956,0,1.5308],
// 4 16 -3.6956 0 -1.5308 -2.7717 0 -1.1481 -3 0 0 -4 0 0
  [4,16,-3.6956,0,-1.5308,-2.7717,0,-1.1481,-3,0,0,-4,0,0],
// 4 16 -2.8284 0 -2.8284 -2.1213 0 -2.1213 -2.7717 0 -1.1481 -3.6956 0 -1.5308
  [4,16,-2.8284,0,-2.8284,-2.1213,0,-2.1213,-2.7717,0,-1.1481,-3.6956,0,-1.5308],
// 4 16 -1.5308 0 -3.6956 -1.1481 0 -2.7717 -2.1213 0 -2.1213 -2.8284 0 -2.8284
  [4,16,-1.5308,0,-3.6956,-1.1481,0,-2.7717,-2.1213,0,-2.1213,-2.8284,0,-2.8284],
// 4 16 0 0 -4 0 0 -3 -1.1481 0 -2.7717 -1.5308 0 -3.6956
  [4,16,0,0,-4,0,0,-3,-1.1481,0,-2.7717,-1.5308,0,-3.6956],
// 4 16 1.5308 0 -3.6956 1.1481 0 -2.7717 0 0 -3 0 0 -4
  [4,16,1.5308,0,-3.6956,1.1481,0,-2.7717,0,0,-3,0,0,-4],
// 4 16 2.8284 0 -2.8284 2.1213 0 -2.1213 1.1481 0 -2.7717 1.5308 0 -3.6956
  [4,16,2.8284,0,-2.8284,2.1213,0,-2.1213,1.1481,0,-2.7717,1.5308,0,-3.6956],
// 4 16 3.6956 0 -1.5308 2.7717 0 -1.1481 2.1213 0 -2.1213 2.8284 0 -2.8284
  [4,16,3.6956,0,-1.5308,2.7717,0,-1.1481,2.1213,0,-2.1213,2.8284,0,-2.8284],
// 4 16 4 0 0 3 0 0 2.7717 0 -1.1481 3.6956 0 -1.5308
  [4,16,4,0,0,3,0,0,2.7717,0,-1.1481,3.6956,0,-1.5308],
// 4 16 3.6956 0 1.5308 2.7717 0 1.1481 3 0 0 4 0 0
  [4,16,3.6956,0,1.5308,2.7717,0,1.1481,3,0,0,4,0,0],
// 4 16 2.8284 0 2.8284 2.1213 0 2.1213 2.7717 0 1.1481 3.6956 0 1.5308
  [4,16,2.8284,0,2.8284,2.1213,0,2.1213,2.7717,0,1.1481,3.6956,0,1.5308],
// 4 16 1.5308 0 3.6956 1.1481 0 2.7717 2.1213 0 2.1213 2.8284 0 2.8284
  [4,16,1.5308,0,3.6956,1.1481,0,2.7717,2.1213,0,2.1213,2.8284,0,2.8284],
// 4 16 0 0 4 0 0 3 1.1481 0 2.7717 1.5308 0 3.6956
  [4,16,0,0,4,0,0,3,1.1481,0,2.7717,1.5308,0,3.6956],
// 0
];
module ldraw_lib__4_4ring3(step=0, col=false, unit=2/5, alt=false, line=0.2, solid=!$preview)
    makepoly(ldraw_lib__4_4ring3(solid), step=step, col=col, unit=unit, alt=alt, line=line, solid=solid);
ldraw_lib__4_4ring3(line=0.2);
// file: ../p/4-4edge.scad
use <../lib.scad>
$fa=1; $fs=0.2;
function ldraw_lib__4_4edge(realsolid=false) = [
// 0 Circle 1.0
// 0 Name: 4-4edge.dat
// 0 Author: James Jessiman
// 0 !LDRAW_ORG Primitive UPDATE 2017-01
// 0 !LICENSE Licensed under CC BY 2.0 and CC BY 4.0 : see CAreadme.txt
// 
// 0 BFC CERTIFY CCW
  [0,"BFC","CERTIFY"],
  [0,"BFC","CCW"],
// 
// 0 !HISTORY 1998-12-15 [PTadmin] Official Update 1998-10
// 0 !HISTORY 2005-12-28 [PTadmin] Official Update 2005-01
// 0 !HISTORY 2007-06-24 [PTadmin] Header formatted for Contributor Agreement
// 0 !HISTORY 2008-07-01 [PTadmin] Official Update 2008-01
// 0 !HISTORY 2017-01-15 [Steffen] BFCed
// 0 !HISTORY 2017-12-30 [PTadmin] Official Update 2017-01
// 
// 
// 2 24 1 0 0 0.9239 0 0.3827
  [2,24,1,0,0,0.9239,0,0.3827],
// 2 24 0.9239 0 0.3827 0.7071 0 0.7071
  [2,24,0.9239,0,0.3827,0.7071,0,0.7071],
// 2 24 0.7071 0 0.7071 0.3827 0 0.9239
  [2,24,0.7071,0,0.7071,0.3827,0,0.9239],
// 2 24 0.3827 0 0.9239 0 0 1
  [2,24,0.3827,0,0.9239,0,0,1],
// 2 24 0 0 1 -0.3827 0 0.9239
  [2,24,0,0,1,-0.3827,0,0.9239],
// 2 24 -0.3827 0 0.9239 -0.7071 0 0.7071
  [2,24,-0.3827,0,0.9239,-0.7071,0,0.7071],
// 2 24 -0.7071 0 0.7071 -0.9239 0 0.3827
  [2,24,-0.7071,0,0.7071,-0.9239,0,0.3827],
// 2 24 -0.9239 0 0.3827 -1 0 -0
  [2,24,-0.9239,0,0.3827,-1,0,-0],
// 2 24 -1 0 -0 -0.9239 0 -0.3827
  [2,24,-1,0,-0,-0.9239,0,-0.3827],
// 2 24 -0.9239 0 -0.3827 -0.7071 0 -0.7071
  [2,24,-0.9239,0,-0.3827,-0.7071,0,-0.7071],
// 2 24 -0.7071 0 -0.7071 -0.3827 0 -0.9239
  [2,24,-0.7071,0,-0.7071,-0.3827,0,-0.9239],
// 2 24 -0.3827 0 -0.9239 0 0 -1
  [2,24,-0.3827,0,-0.9239,0,0,-1],
// 2 24 0 0 -1 0.3827 0 -0.9239
  [2,24,0,0,-1,0.3827,0,-0.9239],
// 2 24 0.3827 0 -0.9239 0.7071 0 -0.7071
  [2,24,0.3827,0,-0.9239,0.7071,0,-0.7071],
// 2 24 0.7071 0 -0.7071 0.9239 0 -0.3827
  [2,24,0.7071,0,-0.7071,0.9239,0,-0.3827],
// 2 24 0.9239 0 -0.3827 1 0 0
  [2,24,0.9239,0,-0.3827,1,0,0],
];
module ldraw_lib__4_4edge(step=0, col=false, unit=2/5, alt=false, line=0.2, solid=!$preview)
    makepoly(ldraw_lib__4_4edge(solid), step=step, col=col, unit=unit, alt=alt, line=line, solid=solid);
ldraw_lib__4_4edge(line=0.2);
// file: 3004.scad
use <../lib.scad>
use <s/3004s01.scad>
$fa=1; $fs=0.2;
function ldraw_lib__3004(realsolid=false) = [
// 0 Brick  1 x  2
// 0 Name: 3004.dat
// 0 Author: James Jessiman
// 0 !LDRAW_ORG Part UPDATE 2022-05
// 0 !LICENSE Licensed under CC BY 2.0 and CC BY 4.0 : see CAreadme.txt
// 
// 0 BFC CERTIFY CCW
  [0,"BFC","CERTIFY"],
  [0,"BFC","CCW"],
// 
// 0 !HISTORY 2001-10-26 [PTadmin] Official Update 2001-01
// 0 !HISTORY 2002-05-07 {unknown} BFC Certification
// 0 !HISTORY 2002-06-11 [PTadmin] Official Update 2002-03
// 0 !HISTORY 2007-05-07 [PTadmin] Header formatted for Contributor Agreement
// 0 !HISTORY 2008-07-01 [PTadmin] Official Update 2008-01
// 0 !HISTORY 2022-08-04 [MagFors] Using subfile
// 0 !HISTORY 2022-09-15 [PTadmin] Official Update 2022-05
// 
// 
// 1 16 0 0 0 1 0 0 0 1 0 0 0 1 s\3004s01.dat
  [1,16,0,0,0,1,0,0,0,1,0,0,0,1, ldraw_lib__s__3004s01(realsolid)],
// 4 16 -20 24 -10 20 24 -10 20 0 -10 -20 0 -10
  [4,16,-20,24,-10,20,24,-10,20,0,-10,-20,0,-10],
];
module ldraw_lib__3004(step=0, col=false, unit=2/5, alt=false, line=0.2, solid=!$preview)
    makepoly(ldraw_lib__3004(solid), step=step, col=col, unit=unit, alt=alt, line=line, solid=solid);
ldraw_lib__3004(line=0.2);
// file: 71533k03.scad
use <../lib.scad>
use <../p/4-4cyli.scad>
$fa=1; $fs=0.2;
function ldraw_lib__71533k03(realsolid=false) = [
// 0 ~Technic Pneumatic Tube Segment
// 0 Name: 71533k03.dat
// 0 Author: Jaco van der Molen [Jaco]
// 0 !LDRAW_ORG Part Flexible_Section UPDATE 2020-01
// 0 !LICENSE Licensed under CC BY 2.0 and CC BY 4.0 : see CAreadme.txt
// 
// 0 BFC CERTIFY CW
  [0,"BFC","CERTIFY"],
  [0,"BFC","CW"],
// 
// 0 !HISTORY 2003-11-30 [Steffen] BFCed
// 0 !HISTORY 2009-12-29 [PTadmin] Official Update 2009-03
// 0 !HISTORY 2020-06-27 [PTadmin] Renamed from 166
// 0 !HISTORY 2020-06-28 [PTadmin] Official Update 2020-01
// 
// 
// 1 16 0 0 0 5 0 0 0 1 0 0 0 5 4-4cyli.dat
  [1,16,0,0,0,5,0,0,0,1,0,0,0,5, ldraw_lib__4_4cyli(realsolid)],
// 0 BFC INVERTNEXT
  [0,"BFC","INVERTNEXT"],
// 1 16 0 0 0 3 0 0 0 1 0 0 0 3 4-4cyli.dat
  [1,16,0,0,0,3,0,0,0,1,0,0,0,3, ldraw_lib__4_4cyli(realsolid)],
// 0
];
module ldraw_lib__71533k03(step=0, col=false, unit=2/5, alt=false, line=0.2, solid=!$preview)
    makepoly(ldraw_lib__71533k03(solid), step=step, col=col, unit=unit, alt=alt, line=line, solid=solid);
ldraw_lib__71533k03(line=0.2);
// file: 71533k02.scad
use <../lib.scad>
use <../p/4-4edge.scad>
use <../p/4-4ring3.scad>
use <../p/4-4ring4.scad>
$fa=1; $fs=0.2;
function ldraw_lib__71533k02(realsolid=false) = [
// 0 ~Technic Pneumatic Tube End (Non-Bulged)
// 0 Name: 71533k02.dat
// 0 Author: Steffen [Steffen]
// 0 !LDRAW_ORG Part Flexible_Section UPDATE 2020-01
// 0 !LICENSE Licensed under CC BY 2.0 and CC BY 4.0 : see CAreadme.txt
// 
// 0 BFC CERTIFY CCW
  [0,"BFC","CERTIFY"],
  [0,"BFC","CCW"],
// 
// 0 !HISTORY 2020-06-28 [PTadmin] Official Update 2020-01
// 
// 
// 0 // This file goes together with 71533k01.dat and 71533k03.dat.
// 0 // Those 3 files can be used to create Technic Pneumatic Tubes
// 0 // with either bulged or non-bulged ends.
// 
// 1 16 0 0 0 1 0 0 0 1 0 0 0 1 4-4ring3.dat
  [1,16,0,0,0,1,0,0,0,1,0,0,0,1, ldraw_lib__4_4ring3(realsolid)],
// 1 16 0 0 0 1 0 0 0 1 0 0 0 1 4-4ring4.dat
  [1,16,0,0,0,1,0,0,0,1,0,0,0,1, ldraw_lib__4_4ring4(realsolid)],
// 1 16 0 0 0 3 0 0 0 3 0 0 0 3 4-4edge.dat
  [1,16,0,0,0,3,0,0,0,3,0,0,0,3, ldraw_lib__4_4edge(realsolid)],
// 1 16 0 0 0 5 0 0 0 5 0 0 0 5 4-4edge.dat
  [1,16,0,0,0,5,0,0,0,5,0,0,0,5, ldraw_lib__4_4edge(realsolid)],
];
module ldraw_lib__71533k02(step=0, col=false, unit=2/5, alt=false, line=0.2, solid=!$preview)
    makepoly(ldraw_lib__71533k02(solid), step=step, col=col, unit=unit, alt=alt, line=line, solid=solid);
ldraw_lib__71533k02(line=0.2);
// main file
use <../lib.scad>
use <71533k02.scad>
use <71533k03.scad>
$fa=1; $fs=0.2;
function ldraw_lib__87948_f1(realsolid=false) = [
// 0 Technic Pneumatic Tube 16L
// 0 Name: 87948-f1.dat
// 0 Author: Philippe Hurbain [Philo]
// 0 !LDRAW_ORG Part UPDATE 2020-02
// 0 !LICENSE Licensed under CC BY 2.0 and CC BY 4.0 : see CAreadme.txt
// 
// 0 BFC CERTIFY CCW
  [0,"BFC","CERTIFY"],
  [0,"BFC","CCW"],
// 
// 0 !KEYWORDS 128 mm
// 
// 0 !HISTORY 2020-09-05 [PTadmin] Official Update 2020-02
// 
// 
// 1 16 -160 0 0 0 1 0 1 0 0 0 0 1 71533k02.dat
  [1,16,-160,0,0,0,1,0,1,0,0,0,0,1, ldraw_lib__71533k02(realsolid)],
// 1 16 160 0 0 0 -1 0 -1 0 0 0 0 1 71533k02.dat
  [1,16,160,0,0,0,-1,0,-1,0,0,0,0,1, ldraw_lib__71533k02(realsolid)],
// 1 16 -160 0 0 0 320 0 1 0 0 0 0 1 71533k03.dat
  [1,16,-160,0,0,0,320,0,1,0,0,0,0,1, ldraw_lib__71533k03(realsolid)],
];
module ldraw_lib__87948_f1(step=0, col=false, unit=2/5, alt=false, line=0.2, solid=!$preview)
    makepoly(ldraw_lib__87948_f1(solid), step=step, col=col, unit=unit, alt=alt, line=line, solid=solid);
ldraw_lib__87948_f1(line=0.2);
